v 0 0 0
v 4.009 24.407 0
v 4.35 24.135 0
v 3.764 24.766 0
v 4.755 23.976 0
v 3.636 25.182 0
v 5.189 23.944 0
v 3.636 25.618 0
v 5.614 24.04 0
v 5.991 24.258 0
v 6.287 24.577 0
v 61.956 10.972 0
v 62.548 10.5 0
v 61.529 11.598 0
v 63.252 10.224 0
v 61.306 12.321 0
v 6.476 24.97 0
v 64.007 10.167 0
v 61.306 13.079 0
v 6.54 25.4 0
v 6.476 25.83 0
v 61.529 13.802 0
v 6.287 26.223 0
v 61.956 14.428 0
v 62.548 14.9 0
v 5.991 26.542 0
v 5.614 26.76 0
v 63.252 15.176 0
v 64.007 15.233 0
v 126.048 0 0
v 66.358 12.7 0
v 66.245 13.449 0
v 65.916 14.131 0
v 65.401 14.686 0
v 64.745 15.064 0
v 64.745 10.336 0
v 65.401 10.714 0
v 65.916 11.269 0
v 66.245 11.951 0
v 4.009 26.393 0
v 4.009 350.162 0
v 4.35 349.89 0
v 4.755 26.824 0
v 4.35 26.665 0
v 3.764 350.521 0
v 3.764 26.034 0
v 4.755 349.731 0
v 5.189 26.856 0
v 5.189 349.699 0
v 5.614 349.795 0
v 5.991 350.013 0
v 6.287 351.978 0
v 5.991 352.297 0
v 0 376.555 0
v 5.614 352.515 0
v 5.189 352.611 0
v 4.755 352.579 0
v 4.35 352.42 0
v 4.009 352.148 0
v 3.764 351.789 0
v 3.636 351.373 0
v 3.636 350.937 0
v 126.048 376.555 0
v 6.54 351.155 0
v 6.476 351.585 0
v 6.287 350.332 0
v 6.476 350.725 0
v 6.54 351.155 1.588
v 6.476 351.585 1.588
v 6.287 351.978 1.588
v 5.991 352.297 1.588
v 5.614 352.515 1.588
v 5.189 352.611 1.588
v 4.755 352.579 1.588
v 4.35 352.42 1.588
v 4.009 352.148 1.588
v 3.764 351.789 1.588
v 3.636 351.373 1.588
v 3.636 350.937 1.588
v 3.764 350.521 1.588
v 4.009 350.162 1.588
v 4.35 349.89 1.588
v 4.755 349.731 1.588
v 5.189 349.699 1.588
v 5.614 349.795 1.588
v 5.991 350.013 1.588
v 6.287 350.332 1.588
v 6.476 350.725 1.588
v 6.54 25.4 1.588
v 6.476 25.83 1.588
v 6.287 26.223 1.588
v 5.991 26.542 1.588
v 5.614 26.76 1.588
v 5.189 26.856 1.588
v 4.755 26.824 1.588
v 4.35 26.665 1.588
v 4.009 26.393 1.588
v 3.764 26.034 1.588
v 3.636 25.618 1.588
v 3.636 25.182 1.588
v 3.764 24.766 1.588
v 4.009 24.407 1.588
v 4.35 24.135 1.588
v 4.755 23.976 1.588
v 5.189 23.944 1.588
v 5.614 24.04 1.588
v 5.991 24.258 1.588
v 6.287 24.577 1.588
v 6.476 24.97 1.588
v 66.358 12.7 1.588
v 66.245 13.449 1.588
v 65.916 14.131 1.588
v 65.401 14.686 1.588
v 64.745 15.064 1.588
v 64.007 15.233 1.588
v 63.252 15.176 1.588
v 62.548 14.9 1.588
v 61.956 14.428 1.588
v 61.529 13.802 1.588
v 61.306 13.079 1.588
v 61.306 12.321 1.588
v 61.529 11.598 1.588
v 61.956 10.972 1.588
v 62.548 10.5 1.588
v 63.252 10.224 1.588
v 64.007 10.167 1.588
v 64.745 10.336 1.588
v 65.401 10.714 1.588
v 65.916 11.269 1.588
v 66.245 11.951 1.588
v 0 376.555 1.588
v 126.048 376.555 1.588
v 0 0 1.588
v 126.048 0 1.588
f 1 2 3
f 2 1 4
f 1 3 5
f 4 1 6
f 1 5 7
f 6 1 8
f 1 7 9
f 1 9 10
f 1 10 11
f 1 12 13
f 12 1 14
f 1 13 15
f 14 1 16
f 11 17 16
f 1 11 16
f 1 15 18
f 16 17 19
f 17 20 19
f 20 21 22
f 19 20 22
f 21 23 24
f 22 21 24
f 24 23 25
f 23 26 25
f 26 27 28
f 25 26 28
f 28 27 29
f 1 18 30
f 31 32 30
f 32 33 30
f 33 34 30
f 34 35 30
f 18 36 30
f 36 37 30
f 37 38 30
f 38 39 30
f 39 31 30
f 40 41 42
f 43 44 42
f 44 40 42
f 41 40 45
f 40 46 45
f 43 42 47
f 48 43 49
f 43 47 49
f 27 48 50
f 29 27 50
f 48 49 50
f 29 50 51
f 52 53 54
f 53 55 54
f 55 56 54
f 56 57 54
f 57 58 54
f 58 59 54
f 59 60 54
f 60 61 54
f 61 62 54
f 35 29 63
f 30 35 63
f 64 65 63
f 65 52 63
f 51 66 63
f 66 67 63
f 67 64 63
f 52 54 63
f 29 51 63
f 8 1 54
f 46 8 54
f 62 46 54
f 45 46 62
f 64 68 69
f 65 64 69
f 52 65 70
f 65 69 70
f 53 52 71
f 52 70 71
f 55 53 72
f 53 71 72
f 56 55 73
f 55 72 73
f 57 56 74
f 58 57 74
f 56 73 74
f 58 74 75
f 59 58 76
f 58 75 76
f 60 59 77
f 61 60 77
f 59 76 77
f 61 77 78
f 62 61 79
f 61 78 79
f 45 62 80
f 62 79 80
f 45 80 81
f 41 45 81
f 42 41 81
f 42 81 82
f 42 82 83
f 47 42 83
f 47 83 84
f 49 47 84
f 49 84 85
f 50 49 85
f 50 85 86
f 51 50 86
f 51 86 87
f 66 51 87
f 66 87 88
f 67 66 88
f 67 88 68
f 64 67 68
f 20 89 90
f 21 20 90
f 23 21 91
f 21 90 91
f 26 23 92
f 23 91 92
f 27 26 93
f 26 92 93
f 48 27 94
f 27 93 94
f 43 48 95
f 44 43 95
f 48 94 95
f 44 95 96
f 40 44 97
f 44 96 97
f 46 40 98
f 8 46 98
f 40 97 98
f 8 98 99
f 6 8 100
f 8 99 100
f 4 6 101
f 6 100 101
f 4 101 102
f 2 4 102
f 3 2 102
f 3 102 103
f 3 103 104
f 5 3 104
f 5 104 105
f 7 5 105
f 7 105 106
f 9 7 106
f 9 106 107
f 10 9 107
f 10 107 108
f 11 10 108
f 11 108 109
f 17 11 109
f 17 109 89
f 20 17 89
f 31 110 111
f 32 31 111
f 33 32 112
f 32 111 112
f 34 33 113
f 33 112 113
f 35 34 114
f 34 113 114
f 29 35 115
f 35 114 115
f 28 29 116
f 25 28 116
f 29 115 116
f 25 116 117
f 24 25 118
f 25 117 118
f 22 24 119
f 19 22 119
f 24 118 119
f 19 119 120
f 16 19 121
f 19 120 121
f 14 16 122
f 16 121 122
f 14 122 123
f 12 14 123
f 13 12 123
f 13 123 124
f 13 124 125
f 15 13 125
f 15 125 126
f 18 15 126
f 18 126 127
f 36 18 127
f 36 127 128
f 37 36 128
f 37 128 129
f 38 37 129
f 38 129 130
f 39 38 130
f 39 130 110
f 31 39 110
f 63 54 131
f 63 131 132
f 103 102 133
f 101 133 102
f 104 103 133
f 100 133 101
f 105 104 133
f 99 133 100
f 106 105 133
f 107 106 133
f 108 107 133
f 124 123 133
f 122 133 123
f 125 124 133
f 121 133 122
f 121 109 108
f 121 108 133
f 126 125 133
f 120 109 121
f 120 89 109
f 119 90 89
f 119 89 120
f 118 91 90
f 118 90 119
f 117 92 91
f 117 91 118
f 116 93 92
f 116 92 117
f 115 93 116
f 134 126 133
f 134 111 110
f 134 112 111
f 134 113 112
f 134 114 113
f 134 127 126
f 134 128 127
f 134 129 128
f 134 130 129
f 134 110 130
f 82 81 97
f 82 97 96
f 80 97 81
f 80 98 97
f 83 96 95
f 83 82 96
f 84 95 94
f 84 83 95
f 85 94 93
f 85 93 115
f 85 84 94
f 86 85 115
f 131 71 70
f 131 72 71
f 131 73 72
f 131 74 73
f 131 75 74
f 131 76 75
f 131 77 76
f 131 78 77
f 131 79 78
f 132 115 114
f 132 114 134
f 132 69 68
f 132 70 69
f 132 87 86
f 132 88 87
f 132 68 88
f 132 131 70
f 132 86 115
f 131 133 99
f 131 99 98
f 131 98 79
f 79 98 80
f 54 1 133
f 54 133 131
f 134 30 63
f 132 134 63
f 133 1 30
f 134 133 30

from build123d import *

# Parameters (mm, degrees)
SKETCH1_W        = 126.0475
SKETCH1_H        = 376.555
MAIN_PLATE_DEPTH = 1.5875
SKETCH2_R        = 1.4605
BOLT_HOLES_DEPTH = 6.35
LPATTERN1_COUNT  = 2
LPATTERN1_PITCH  = 325.755
SKETCH3_R        = 2.54
WIRE_HOLE_DEPTH  = 6.35


with BuildPart() as part:
    # Sketch1 → Main Plate (new body)
    with BuildSketch(Plane.XY):
        with Locations((63.02375, 188.2775)):
            Rectangle(SKETCH1_W, SKETCH1_H)
    extrude(amount=MAIN_PLATE_DEPTH)

    # Sketch2 → Bolt Holes (cut)
    with BuildSketch(Plane.XY.offset(1.5875)):
        with Locations((5.08, 351.155)):
            Circle(SKETCH2_R)
    bolt_holes = extrude(amount=-BOLT_HOLES_DEPTH, mode=Mode.SUBTRACT)

    # LPattern1: Bolt Holes ×2
    with Locations(*[(0, -i * LPATTERN1_PITCH, 0) for i in range(1, LPATTERN1_COUNT)]):
        add(bolt_holes, mode=Mode.SUBTRACT)

    # Sketch3 → Wire Hole (cut)
    with BuildSketch(Plane.XY.offset(1.5875)):
        with Locations((63.8175, 12.7)):
            Circle(SKETCH3_R)
    extrude(amount=-WIRE_HOLE_DEPTH, mode=Mode.SUBTRACT)


solid = part.part
